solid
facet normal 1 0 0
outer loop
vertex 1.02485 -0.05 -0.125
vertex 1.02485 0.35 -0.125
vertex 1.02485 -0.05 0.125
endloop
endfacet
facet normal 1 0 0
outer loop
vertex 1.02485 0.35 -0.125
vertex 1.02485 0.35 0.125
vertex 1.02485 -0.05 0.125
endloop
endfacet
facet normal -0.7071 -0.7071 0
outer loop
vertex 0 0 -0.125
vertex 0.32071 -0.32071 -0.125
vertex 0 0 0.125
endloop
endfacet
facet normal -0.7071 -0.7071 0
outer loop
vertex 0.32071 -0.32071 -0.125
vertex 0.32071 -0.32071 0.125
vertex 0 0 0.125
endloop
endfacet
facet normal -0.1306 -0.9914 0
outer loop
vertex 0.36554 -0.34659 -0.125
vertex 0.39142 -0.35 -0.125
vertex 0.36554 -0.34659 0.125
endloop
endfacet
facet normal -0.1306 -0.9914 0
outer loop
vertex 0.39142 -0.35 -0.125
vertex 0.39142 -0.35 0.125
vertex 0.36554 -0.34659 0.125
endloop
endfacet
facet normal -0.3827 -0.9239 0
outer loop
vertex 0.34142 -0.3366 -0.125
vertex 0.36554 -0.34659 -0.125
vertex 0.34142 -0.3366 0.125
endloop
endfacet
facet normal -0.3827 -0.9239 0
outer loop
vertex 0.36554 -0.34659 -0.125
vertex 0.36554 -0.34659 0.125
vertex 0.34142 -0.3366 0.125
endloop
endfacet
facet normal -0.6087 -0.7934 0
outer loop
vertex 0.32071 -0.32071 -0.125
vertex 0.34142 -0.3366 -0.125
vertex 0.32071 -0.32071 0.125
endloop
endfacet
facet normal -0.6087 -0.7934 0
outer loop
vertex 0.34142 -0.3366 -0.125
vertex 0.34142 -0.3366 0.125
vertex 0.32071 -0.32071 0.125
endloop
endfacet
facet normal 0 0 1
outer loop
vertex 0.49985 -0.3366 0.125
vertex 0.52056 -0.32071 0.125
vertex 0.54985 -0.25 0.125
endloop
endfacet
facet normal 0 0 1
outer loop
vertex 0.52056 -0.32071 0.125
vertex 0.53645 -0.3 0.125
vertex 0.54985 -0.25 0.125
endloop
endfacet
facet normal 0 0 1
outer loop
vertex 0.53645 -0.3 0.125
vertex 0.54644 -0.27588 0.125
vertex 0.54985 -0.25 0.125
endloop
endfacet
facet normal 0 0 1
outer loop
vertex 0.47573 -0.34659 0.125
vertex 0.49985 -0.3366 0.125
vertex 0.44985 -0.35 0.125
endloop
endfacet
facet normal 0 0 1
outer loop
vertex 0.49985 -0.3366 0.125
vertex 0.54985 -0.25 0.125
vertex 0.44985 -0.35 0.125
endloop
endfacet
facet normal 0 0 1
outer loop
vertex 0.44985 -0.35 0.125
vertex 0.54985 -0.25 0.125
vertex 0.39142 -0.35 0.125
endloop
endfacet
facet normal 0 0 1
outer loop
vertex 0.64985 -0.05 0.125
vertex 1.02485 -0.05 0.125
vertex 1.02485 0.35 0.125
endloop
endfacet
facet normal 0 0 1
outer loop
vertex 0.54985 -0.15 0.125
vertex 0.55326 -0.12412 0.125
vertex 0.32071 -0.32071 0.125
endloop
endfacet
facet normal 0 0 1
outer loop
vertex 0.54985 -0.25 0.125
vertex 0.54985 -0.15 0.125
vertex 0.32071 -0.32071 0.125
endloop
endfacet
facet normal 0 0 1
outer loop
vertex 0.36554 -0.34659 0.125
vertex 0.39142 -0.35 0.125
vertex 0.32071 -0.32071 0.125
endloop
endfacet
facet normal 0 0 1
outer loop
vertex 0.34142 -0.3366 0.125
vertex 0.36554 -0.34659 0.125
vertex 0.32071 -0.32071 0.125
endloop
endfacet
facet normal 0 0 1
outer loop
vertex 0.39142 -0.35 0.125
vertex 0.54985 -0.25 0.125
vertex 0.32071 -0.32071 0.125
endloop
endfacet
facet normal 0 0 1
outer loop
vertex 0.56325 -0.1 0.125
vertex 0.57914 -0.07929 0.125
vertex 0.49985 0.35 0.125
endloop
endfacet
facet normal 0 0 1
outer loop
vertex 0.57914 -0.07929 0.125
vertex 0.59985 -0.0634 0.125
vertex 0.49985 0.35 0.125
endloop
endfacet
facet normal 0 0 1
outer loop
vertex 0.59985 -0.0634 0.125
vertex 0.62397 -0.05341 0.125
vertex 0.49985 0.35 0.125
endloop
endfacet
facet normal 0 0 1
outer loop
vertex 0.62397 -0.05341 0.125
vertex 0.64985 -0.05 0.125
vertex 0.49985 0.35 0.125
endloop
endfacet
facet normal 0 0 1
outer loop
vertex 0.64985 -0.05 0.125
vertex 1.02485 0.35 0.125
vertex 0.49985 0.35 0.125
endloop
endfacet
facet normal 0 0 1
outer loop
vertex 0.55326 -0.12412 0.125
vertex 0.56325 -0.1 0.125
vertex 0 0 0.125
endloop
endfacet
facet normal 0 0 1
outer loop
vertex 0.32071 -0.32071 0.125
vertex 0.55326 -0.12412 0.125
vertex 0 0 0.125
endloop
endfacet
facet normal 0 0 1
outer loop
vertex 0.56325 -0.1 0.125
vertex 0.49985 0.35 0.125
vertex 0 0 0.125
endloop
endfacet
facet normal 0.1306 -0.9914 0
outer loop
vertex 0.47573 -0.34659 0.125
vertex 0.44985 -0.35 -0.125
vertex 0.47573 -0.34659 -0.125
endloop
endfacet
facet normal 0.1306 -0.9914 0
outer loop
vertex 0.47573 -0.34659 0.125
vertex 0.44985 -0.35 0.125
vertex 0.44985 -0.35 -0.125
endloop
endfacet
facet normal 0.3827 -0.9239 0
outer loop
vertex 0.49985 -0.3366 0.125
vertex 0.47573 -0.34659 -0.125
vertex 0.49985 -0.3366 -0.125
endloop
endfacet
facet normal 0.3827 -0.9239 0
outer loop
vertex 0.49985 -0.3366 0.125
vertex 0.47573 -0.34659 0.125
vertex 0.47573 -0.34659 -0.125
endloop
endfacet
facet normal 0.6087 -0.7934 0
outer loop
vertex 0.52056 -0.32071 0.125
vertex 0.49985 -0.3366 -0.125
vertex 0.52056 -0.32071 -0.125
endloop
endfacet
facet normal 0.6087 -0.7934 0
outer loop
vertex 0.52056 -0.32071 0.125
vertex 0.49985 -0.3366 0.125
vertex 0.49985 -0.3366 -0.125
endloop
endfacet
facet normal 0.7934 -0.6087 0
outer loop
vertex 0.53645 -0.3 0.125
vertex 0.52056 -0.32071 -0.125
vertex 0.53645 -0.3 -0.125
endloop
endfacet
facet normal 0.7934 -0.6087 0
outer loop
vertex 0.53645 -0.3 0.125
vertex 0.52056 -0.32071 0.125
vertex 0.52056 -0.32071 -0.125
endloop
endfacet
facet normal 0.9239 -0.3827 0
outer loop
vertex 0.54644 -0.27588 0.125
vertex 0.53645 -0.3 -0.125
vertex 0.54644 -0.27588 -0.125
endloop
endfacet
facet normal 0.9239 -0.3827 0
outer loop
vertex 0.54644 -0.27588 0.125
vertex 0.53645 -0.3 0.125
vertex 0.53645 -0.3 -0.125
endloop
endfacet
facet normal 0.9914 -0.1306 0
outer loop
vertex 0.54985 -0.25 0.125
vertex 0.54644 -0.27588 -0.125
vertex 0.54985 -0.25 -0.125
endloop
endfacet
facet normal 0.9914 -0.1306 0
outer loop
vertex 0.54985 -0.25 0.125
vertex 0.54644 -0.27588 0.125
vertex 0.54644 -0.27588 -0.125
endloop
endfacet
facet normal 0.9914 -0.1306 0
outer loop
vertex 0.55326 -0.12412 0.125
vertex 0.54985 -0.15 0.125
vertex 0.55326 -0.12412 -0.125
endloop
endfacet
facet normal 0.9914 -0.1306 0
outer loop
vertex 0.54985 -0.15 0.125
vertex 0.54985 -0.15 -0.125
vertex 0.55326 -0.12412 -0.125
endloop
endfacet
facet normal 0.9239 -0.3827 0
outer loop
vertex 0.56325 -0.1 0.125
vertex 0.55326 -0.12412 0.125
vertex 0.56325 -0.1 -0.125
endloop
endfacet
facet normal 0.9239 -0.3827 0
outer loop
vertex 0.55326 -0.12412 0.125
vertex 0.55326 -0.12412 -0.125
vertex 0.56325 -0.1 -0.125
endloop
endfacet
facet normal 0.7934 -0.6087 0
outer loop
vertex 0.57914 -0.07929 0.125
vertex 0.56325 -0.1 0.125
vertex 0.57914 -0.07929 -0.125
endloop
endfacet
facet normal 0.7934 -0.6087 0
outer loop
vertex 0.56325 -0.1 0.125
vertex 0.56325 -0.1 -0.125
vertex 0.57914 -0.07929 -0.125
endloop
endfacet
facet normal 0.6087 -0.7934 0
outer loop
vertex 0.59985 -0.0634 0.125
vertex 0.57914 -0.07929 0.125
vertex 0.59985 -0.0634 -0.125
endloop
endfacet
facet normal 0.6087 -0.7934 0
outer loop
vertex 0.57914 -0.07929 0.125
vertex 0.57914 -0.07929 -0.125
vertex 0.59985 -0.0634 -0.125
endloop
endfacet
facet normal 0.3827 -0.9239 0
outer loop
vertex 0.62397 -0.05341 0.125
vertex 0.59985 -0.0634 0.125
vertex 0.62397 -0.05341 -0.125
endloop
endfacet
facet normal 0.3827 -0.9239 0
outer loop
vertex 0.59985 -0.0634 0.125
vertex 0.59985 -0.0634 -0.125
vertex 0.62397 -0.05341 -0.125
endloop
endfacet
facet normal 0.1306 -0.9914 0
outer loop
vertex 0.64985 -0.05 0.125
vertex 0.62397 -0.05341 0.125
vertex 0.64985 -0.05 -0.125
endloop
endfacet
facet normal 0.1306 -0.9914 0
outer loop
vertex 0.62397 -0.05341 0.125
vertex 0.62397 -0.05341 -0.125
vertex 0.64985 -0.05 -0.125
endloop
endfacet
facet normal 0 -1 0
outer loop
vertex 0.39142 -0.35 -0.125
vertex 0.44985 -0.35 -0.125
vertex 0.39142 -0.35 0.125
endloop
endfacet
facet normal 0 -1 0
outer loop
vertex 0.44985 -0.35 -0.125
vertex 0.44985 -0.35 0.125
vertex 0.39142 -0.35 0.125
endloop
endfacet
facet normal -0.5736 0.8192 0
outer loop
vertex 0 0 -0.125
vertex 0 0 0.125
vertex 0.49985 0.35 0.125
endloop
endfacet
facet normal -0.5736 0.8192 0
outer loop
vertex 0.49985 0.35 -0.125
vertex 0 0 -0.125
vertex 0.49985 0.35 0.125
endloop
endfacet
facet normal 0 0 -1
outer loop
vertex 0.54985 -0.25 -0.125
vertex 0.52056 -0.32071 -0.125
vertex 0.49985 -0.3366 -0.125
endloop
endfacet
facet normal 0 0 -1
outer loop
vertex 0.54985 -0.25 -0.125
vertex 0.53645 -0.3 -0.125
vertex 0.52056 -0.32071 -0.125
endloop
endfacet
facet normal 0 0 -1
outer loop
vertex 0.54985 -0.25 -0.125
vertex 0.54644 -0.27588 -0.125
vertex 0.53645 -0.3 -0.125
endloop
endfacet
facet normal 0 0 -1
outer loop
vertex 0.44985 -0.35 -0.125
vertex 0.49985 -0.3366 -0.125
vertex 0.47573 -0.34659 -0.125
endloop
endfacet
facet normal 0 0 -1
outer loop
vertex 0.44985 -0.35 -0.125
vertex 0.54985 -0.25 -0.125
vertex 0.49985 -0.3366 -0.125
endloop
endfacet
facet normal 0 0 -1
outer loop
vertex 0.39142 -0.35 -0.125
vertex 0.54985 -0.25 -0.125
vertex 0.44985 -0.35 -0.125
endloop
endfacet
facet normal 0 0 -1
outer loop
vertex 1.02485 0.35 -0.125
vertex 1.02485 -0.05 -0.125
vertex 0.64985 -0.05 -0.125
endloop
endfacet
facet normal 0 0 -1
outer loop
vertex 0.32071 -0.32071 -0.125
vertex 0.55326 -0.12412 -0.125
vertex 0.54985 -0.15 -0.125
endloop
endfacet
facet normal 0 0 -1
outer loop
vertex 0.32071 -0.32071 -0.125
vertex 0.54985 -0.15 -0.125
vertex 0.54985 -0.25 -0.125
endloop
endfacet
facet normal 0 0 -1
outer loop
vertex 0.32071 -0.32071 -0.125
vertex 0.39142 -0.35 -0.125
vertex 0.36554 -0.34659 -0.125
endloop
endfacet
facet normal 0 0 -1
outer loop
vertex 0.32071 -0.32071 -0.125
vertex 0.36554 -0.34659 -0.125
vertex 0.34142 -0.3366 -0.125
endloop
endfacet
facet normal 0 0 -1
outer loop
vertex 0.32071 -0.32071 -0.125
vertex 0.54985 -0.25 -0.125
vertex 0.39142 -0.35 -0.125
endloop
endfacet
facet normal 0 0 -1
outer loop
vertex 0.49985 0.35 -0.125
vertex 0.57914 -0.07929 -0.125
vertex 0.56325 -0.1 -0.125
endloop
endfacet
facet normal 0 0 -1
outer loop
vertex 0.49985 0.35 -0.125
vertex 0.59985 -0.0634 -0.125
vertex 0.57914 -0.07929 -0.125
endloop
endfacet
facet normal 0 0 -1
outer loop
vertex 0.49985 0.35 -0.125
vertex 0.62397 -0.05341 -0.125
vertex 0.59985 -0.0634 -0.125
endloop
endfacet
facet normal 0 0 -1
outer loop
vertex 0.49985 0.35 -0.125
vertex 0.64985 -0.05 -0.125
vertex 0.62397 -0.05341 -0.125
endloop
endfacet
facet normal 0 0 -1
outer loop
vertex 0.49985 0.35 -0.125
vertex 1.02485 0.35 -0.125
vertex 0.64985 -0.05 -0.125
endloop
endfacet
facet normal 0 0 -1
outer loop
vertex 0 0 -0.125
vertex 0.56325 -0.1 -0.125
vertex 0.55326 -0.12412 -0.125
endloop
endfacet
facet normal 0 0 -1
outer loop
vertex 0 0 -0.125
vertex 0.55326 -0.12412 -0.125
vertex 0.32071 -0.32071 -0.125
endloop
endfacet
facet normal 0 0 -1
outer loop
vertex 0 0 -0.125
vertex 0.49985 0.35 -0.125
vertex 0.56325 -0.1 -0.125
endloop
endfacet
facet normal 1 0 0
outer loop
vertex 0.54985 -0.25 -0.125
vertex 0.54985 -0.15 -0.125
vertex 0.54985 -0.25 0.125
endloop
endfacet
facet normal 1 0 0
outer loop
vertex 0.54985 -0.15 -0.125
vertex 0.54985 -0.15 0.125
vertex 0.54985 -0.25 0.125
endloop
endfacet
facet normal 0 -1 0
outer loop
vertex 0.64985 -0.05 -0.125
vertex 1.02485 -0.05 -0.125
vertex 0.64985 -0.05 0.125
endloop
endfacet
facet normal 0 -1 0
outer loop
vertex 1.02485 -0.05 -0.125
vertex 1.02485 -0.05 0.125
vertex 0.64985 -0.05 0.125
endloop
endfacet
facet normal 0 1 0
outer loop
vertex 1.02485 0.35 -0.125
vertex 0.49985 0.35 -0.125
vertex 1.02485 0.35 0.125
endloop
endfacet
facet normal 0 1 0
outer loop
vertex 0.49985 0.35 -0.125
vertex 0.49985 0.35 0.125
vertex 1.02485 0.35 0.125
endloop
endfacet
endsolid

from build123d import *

# Parameters (mm, degrees)
BOSS_EXTRUDE1_DEPTH = 0.125
FILLET1_R           = 0.1


with BuildPart() as part:
    # frame_outline → Boss-Extrude1 (new, symmetric)
    with BuildSketch(Plane.XY):
        Polygon((0, 0), (0.499851802, 0.35), (1.024851802, 0.35), (1.024851802, -0.05), (0.549851802, -0.05), (0.549851802, -0.35), (0.35, -0.35), align=None)
    extrude(amount=BOSS_EXTRUDE1_DEPTH, both=True)

    # Fillet1
    fillet1_edges = [part.edges().sort_by_distance(p)[0] for p in [
        (0.549851802, -0.05, 0),
        (0.549851802, -0.35, 0),
        (0.35, -0.35, 0),
    ]]
    fillet(fillet1_edges, radius=FILLET1_R)


solid = part.part
